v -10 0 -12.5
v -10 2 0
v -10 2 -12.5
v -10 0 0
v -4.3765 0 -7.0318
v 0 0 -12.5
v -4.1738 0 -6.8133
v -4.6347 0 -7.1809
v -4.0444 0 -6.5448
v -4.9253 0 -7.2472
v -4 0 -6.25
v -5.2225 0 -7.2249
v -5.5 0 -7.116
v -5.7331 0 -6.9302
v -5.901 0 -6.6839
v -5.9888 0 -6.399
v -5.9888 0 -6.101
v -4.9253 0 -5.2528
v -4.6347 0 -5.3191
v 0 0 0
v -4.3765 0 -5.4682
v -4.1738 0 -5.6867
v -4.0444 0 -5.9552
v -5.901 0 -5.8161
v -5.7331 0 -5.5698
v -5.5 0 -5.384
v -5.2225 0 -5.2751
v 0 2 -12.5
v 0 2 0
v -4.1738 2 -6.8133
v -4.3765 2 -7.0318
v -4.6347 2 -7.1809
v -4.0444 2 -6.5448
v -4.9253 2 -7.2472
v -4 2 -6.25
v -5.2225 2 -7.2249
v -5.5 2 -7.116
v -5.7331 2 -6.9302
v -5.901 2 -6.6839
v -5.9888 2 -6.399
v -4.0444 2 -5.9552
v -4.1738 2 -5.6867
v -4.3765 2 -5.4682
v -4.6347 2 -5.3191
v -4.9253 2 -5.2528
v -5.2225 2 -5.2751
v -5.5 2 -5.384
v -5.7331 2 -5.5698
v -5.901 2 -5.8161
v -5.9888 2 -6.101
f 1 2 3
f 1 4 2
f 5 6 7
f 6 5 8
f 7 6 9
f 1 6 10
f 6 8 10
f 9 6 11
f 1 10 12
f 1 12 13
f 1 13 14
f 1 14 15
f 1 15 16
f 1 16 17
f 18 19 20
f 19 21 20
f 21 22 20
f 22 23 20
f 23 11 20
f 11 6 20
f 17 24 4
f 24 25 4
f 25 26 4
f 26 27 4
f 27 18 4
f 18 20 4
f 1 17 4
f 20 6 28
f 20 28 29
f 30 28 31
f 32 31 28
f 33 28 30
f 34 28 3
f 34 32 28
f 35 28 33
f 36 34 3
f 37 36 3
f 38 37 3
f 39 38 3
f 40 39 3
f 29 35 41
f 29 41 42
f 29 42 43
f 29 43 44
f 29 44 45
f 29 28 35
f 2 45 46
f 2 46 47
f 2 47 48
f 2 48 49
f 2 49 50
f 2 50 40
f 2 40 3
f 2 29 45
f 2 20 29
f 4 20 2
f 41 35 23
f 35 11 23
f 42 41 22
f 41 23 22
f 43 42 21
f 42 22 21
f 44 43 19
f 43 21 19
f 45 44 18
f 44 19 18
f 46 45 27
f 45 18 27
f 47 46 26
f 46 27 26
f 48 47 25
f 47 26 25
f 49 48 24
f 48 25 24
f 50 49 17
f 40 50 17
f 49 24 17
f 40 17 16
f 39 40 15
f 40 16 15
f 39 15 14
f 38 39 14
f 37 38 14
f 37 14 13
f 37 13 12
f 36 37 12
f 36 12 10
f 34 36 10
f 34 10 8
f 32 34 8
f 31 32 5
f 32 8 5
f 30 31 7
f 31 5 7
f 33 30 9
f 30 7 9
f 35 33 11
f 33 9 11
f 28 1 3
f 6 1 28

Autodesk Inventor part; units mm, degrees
ref_plane "YZ Plane" through (0, 0, 0) normal (1, 0, 0) x (0, 1, 0)
ref_plane "XZ Plane" through (0, 0, 0) normal (0, 1, 0) x (-1, 0, 0)
ref_plane "XY Plane" through (0, 0, 0) normal (0, 0, 1) x (1, 0, 0)
sketch "Sketch1" plane through (0, 0, 0) normal (0, 1, 0) x (-1, 0, 0)
  line L0 (0, 0) -> (10, 0)
  line L1 (10, 0) -> (10, -12.5)
  line L2 (10, -12.5) -> (0, -12.5)
  line L3 (0, -12.5) -> (0, 0)
  dimension "d0" = 10
  dimension "d1" = 12.5
extrude "Extrusion1" add sketch "Sketch1" along normal blind 2
sketch "Sketch2" plane through (0, 0, 0) normal (0, -1, 0) x (1, 0, 0)
  line L0 (-10, -12.5) -> (-10, 0) projected
  line L1 (-10, 0) -> (-5, 0)
  line L2 (-5, 0) -> (-5, -6.25)
  line L3 (-5, -6.25) -> (-10, -6.25)
  line L4 (-10, -6.25) -> (-10, 0)
  circle A0 centre (-5, -6.25) radius 1
  point P0 (0, 0)
  dimension "d4" = 5
  dimension "d5" = 6.25
  dimension "d6" = 2
extrude "Extrusion2" cut sketch "Sketch2" against normal blind 2 contours A0 L2 L3 | L3 L2 A0
properties part number "LaserMoutBottom"
